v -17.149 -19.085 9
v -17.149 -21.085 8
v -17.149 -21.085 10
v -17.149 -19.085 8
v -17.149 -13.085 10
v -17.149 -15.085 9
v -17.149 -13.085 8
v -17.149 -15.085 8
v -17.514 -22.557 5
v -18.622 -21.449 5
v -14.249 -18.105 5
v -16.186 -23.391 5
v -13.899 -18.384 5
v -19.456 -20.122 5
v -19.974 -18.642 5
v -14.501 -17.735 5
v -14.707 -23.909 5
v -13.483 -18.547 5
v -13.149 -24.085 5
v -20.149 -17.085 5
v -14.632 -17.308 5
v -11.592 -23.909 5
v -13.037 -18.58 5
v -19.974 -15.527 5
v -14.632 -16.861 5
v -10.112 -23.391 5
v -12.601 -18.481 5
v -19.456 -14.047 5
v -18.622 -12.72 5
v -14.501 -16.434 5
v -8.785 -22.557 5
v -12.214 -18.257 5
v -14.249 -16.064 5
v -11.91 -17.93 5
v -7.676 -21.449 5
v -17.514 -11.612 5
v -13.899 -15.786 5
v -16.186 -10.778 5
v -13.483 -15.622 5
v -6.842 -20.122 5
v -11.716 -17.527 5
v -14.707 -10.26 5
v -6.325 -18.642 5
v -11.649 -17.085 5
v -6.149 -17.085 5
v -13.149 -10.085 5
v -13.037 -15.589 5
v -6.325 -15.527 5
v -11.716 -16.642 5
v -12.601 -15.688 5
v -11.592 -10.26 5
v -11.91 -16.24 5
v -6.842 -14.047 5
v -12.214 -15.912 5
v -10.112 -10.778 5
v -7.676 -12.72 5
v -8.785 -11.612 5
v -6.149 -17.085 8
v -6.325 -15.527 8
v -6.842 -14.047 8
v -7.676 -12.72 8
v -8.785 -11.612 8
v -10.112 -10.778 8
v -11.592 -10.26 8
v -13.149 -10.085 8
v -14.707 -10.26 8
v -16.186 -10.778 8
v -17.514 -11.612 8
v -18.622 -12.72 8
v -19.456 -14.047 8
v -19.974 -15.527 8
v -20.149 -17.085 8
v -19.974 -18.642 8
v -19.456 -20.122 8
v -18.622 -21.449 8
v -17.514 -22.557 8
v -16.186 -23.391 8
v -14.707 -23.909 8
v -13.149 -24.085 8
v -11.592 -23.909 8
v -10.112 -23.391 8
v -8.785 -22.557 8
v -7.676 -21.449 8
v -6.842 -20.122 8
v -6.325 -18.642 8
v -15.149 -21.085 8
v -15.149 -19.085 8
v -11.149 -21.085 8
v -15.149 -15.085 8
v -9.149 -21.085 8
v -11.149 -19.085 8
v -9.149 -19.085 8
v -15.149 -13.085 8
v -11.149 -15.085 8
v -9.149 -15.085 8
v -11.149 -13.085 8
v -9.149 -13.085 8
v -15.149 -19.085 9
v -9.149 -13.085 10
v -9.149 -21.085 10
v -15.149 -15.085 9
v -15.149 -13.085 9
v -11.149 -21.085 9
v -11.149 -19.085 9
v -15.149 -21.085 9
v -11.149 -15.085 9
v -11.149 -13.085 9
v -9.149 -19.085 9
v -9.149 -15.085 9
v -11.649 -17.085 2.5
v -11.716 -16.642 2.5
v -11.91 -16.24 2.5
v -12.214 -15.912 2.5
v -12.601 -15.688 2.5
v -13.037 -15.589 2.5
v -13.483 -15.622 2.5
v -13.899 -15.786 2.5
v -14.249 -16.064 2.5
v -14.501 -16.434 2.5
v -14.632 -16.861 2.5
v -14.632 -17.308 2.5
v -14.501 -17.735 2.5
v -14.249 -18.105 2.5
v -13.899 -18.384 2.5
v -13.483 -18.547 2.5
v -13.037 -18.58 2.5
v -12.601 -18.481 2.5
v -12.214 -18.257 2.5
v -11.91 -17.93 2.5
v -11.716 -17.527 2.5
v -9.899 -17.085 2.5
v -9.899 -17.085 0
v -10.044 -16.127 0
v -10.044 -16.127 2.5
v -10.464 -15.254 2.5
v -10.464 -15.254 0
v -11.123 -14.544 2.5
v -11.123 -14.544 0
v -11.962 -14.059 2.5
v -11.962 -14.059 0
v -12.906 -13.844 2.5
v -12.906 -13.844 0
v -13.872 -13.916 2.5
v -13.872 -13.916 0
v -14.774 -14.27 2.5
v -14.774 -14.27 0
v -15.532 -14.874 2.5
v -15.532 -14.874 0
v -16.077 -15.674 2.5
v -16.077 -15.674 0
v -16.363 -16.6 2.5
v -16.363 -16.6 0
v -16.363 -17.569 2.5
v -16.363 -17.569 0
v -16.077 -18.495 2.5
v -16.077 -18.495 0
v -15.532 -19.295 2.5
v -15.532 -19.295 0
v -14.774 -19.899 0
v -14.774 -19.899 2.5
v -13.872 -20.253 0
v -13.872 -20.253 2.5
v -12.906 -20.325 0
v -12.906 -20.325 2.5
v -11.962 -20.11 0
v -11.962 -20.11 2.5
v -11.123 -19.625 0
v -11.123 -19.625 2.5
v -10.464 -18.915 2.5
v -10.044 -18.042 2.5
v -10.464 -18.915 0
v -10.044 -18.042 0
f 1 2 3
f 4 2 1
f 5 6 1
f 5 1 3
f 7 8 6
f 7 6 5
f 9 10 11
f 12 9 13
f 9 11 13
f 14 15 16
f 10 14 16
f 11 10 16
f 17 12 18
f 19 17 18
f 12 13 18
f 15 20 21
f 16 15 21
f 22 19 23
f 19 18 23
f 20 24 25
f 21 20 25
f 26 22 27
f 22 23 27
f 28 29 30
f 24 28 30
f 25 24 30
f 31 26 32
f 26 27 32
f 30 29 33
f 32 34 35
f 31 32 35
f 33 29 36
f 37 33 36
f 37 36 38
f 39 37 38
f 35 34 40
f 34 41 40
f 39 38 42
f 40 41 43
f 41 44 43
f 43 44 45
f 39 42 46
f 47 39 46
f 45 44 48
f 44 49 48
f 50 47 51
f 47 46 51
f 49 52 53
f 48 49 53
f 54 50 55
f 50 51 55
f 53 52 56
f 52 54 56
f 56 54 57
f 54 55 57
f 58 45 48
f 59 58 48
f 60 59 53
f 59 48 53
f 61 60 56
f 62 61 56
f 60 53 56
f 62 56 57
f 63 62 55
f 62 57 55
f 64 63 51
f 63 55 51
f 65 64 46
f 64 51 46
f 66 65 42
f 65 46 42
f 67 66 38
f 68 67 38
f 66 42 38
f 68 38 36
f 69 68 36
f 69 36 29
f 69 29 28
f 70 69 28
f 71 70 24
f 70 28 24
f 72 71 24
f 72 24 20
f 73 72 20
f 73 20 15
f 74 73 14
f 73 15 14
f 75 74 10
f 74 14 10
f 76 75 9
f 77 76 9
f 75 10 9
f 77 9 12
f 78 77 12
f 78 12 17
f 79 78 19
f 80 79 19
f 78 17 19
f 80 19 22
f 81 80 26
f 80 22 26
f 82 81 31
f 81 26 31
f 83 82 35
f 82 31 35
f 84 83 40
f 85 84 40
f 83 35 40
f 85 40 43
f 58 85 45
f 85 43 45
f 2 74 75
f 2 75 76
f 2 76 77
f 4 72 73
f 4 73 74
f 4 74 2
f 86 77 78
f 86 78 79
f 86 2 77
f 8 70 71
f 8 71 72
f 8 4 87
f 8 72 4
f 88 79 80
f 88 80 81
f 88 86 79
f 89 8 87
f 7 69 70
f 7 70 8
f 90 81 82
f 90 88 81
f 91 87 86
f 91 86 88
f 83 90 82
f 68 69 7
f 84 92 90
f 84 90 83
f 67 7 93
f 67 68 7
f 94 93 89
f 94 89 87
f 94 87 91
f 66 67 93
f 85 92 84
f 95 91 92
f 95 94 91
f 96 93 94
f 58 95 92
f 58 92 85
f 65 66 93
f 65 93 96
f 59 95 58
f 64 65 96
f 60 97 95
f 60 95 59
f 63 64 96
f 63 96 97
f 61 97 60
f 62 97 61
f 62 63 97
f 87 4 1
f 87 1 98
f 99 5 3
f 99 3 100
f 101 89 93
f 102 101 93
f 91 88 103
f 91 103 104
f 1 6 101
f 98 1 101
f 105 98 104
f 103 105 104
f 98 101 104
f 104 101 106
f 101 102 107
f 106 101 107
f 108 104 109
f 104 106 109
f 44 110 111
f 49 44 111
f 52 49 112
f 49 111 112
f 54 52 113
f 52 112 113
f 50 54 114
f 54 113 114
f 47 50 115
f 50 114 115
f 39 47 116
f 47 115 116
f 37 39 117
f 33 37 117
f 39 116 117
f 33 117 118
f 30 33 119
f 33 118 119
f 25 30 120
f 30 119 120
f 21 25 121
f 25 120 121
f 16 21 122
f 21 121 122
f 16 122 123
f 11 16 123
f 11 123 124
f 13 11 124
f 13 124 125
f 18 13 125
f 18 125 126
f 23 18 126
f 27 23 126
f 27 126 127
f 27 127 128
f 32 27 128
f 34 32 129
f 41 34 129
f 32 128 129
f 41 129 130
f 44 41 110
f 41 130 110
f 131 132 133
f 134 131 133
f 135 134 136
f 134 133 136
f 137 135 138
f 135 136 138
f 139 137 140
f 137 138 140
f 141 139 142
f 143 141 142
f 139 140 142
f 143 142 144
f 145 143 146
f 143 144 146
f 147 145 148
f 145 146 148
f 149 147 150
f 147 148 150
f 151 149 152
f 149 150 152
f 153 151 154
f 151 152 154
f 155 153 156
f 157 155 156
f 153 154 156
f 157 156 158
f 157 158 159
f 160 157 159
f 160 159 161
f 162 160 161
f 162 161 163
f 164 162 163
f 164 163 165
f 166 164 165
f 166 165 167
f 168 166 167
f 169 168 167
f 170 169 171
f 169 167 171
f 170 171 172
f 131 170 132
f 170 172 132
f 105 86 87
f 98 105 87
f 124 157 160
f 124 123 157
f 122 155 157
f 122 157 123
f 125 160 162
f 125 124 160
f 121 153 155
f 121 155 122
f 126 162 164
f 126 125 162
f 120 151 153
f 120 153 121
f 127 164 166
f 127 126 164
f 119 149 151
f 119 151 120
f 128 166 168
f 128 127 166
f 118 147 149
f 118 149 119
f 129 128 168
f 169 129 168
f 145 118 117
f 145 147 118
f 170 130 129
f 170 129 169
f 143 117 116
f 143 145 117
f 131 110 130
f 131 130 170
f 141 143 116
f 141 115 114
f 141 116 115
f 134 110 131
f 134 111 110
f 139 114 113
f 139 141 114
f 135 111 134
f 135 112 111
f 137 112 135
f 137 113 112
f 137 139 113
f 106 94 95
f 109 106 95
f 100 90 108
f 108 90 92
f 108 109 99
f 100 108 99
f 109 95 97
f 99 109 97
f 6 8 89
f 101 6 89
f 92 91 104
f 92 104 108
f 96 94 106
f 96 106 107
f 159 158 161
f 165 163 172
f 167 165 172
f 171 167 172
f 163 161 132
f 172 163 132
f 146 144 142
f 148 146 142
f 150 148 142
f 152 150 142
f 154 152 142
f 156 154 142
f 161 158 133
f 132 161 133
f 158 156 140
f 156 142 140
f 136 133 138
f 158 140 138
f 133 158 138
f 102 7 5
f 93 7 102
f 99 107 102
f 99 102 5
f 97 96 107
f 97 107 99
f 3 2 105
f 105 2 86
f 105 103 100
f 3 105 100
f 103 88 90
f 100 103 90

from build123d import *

# Parameters (mm, degrees)
F0_R      = 3.25
F1_DEPTH  = 2.5
F2_R      = 1.5
F3_DEPTH  = 2.5
F4_R      = 7
F4_R_2    = 1.5
F5_DEPTH  = 3
F6_R      = 1.5
F7_DEPTH  = 3
F8_W      = 2
F8_H      = 2
F9_DEPTH  = 2
F11_DEPTH = 1


with BuildPart() as f1:
    # F0 (on Top) → F1 (new body)
    with BuildSketch(Plane.XY):
        with Locations((-13.149204, -17.084545)):
            Circle(F0_R)
    extrude(amount=F1_DEPTH)

    # F2 (on face) → F3 (join)
    with BuildSketch(Plane.XY.offset(2.5)):
        with Locations((-13.149204, -17.084545)):
            Circle(F2_R)
    extrude(amount=F3_DEPTH)

    # F4 (on face) → F5 (join)
    with BuildSketch(Plane.XY.offset(5)):
        with Locations((-13.149204, -17.084545)):
            Circle(F4_R)
        with Locations((-13.149204, -17.084545)):
            Circle(F4_R_2, mode=Mode.SUBTRACT)
    extrude(amount=F5_DEPTH)

    # F6 (on face) → F7 (join)
    with BuildSketch(Plane.XY.offset(5)):
        with Locations((-13.149204, -17.084545)):
            Circle(F6_R)
    extrude(amount=F7_DEPTH)

    # F8 (on face) → F9 (join)
    with BuildSketch(Plane.XY.offset(8)):
        with Locations((-16.149204, -14.084545)):
            Rectangle(F8_W, F8_H)
        with Locations((-10.149204, -14.084545)):
            Rectangle(F8_W, F8_H)
        with Locations((-10.149204, -20.084545)):
            Rectangle(F8_W, F8_H)
        with Locations((-16.149204, -20.084545)):
            Rectangle(F8_W, F8_H)
    extrude(amount=F9_DEPTH)

    # F10 (on face) → F11 (join)
    with BuildSketch(Plane.XY.offset(10)):
        Polygon((-9.149204, -13.084545), (-15.149204, -13.084545), (-15.149204, -15.084545), (-17.149204, -15.084545), (-17.149204, -21.084545), (-9.149204, -21.084545), align=None)
    extrude(amount=-F11_DEPTH)


solid = f1.part
